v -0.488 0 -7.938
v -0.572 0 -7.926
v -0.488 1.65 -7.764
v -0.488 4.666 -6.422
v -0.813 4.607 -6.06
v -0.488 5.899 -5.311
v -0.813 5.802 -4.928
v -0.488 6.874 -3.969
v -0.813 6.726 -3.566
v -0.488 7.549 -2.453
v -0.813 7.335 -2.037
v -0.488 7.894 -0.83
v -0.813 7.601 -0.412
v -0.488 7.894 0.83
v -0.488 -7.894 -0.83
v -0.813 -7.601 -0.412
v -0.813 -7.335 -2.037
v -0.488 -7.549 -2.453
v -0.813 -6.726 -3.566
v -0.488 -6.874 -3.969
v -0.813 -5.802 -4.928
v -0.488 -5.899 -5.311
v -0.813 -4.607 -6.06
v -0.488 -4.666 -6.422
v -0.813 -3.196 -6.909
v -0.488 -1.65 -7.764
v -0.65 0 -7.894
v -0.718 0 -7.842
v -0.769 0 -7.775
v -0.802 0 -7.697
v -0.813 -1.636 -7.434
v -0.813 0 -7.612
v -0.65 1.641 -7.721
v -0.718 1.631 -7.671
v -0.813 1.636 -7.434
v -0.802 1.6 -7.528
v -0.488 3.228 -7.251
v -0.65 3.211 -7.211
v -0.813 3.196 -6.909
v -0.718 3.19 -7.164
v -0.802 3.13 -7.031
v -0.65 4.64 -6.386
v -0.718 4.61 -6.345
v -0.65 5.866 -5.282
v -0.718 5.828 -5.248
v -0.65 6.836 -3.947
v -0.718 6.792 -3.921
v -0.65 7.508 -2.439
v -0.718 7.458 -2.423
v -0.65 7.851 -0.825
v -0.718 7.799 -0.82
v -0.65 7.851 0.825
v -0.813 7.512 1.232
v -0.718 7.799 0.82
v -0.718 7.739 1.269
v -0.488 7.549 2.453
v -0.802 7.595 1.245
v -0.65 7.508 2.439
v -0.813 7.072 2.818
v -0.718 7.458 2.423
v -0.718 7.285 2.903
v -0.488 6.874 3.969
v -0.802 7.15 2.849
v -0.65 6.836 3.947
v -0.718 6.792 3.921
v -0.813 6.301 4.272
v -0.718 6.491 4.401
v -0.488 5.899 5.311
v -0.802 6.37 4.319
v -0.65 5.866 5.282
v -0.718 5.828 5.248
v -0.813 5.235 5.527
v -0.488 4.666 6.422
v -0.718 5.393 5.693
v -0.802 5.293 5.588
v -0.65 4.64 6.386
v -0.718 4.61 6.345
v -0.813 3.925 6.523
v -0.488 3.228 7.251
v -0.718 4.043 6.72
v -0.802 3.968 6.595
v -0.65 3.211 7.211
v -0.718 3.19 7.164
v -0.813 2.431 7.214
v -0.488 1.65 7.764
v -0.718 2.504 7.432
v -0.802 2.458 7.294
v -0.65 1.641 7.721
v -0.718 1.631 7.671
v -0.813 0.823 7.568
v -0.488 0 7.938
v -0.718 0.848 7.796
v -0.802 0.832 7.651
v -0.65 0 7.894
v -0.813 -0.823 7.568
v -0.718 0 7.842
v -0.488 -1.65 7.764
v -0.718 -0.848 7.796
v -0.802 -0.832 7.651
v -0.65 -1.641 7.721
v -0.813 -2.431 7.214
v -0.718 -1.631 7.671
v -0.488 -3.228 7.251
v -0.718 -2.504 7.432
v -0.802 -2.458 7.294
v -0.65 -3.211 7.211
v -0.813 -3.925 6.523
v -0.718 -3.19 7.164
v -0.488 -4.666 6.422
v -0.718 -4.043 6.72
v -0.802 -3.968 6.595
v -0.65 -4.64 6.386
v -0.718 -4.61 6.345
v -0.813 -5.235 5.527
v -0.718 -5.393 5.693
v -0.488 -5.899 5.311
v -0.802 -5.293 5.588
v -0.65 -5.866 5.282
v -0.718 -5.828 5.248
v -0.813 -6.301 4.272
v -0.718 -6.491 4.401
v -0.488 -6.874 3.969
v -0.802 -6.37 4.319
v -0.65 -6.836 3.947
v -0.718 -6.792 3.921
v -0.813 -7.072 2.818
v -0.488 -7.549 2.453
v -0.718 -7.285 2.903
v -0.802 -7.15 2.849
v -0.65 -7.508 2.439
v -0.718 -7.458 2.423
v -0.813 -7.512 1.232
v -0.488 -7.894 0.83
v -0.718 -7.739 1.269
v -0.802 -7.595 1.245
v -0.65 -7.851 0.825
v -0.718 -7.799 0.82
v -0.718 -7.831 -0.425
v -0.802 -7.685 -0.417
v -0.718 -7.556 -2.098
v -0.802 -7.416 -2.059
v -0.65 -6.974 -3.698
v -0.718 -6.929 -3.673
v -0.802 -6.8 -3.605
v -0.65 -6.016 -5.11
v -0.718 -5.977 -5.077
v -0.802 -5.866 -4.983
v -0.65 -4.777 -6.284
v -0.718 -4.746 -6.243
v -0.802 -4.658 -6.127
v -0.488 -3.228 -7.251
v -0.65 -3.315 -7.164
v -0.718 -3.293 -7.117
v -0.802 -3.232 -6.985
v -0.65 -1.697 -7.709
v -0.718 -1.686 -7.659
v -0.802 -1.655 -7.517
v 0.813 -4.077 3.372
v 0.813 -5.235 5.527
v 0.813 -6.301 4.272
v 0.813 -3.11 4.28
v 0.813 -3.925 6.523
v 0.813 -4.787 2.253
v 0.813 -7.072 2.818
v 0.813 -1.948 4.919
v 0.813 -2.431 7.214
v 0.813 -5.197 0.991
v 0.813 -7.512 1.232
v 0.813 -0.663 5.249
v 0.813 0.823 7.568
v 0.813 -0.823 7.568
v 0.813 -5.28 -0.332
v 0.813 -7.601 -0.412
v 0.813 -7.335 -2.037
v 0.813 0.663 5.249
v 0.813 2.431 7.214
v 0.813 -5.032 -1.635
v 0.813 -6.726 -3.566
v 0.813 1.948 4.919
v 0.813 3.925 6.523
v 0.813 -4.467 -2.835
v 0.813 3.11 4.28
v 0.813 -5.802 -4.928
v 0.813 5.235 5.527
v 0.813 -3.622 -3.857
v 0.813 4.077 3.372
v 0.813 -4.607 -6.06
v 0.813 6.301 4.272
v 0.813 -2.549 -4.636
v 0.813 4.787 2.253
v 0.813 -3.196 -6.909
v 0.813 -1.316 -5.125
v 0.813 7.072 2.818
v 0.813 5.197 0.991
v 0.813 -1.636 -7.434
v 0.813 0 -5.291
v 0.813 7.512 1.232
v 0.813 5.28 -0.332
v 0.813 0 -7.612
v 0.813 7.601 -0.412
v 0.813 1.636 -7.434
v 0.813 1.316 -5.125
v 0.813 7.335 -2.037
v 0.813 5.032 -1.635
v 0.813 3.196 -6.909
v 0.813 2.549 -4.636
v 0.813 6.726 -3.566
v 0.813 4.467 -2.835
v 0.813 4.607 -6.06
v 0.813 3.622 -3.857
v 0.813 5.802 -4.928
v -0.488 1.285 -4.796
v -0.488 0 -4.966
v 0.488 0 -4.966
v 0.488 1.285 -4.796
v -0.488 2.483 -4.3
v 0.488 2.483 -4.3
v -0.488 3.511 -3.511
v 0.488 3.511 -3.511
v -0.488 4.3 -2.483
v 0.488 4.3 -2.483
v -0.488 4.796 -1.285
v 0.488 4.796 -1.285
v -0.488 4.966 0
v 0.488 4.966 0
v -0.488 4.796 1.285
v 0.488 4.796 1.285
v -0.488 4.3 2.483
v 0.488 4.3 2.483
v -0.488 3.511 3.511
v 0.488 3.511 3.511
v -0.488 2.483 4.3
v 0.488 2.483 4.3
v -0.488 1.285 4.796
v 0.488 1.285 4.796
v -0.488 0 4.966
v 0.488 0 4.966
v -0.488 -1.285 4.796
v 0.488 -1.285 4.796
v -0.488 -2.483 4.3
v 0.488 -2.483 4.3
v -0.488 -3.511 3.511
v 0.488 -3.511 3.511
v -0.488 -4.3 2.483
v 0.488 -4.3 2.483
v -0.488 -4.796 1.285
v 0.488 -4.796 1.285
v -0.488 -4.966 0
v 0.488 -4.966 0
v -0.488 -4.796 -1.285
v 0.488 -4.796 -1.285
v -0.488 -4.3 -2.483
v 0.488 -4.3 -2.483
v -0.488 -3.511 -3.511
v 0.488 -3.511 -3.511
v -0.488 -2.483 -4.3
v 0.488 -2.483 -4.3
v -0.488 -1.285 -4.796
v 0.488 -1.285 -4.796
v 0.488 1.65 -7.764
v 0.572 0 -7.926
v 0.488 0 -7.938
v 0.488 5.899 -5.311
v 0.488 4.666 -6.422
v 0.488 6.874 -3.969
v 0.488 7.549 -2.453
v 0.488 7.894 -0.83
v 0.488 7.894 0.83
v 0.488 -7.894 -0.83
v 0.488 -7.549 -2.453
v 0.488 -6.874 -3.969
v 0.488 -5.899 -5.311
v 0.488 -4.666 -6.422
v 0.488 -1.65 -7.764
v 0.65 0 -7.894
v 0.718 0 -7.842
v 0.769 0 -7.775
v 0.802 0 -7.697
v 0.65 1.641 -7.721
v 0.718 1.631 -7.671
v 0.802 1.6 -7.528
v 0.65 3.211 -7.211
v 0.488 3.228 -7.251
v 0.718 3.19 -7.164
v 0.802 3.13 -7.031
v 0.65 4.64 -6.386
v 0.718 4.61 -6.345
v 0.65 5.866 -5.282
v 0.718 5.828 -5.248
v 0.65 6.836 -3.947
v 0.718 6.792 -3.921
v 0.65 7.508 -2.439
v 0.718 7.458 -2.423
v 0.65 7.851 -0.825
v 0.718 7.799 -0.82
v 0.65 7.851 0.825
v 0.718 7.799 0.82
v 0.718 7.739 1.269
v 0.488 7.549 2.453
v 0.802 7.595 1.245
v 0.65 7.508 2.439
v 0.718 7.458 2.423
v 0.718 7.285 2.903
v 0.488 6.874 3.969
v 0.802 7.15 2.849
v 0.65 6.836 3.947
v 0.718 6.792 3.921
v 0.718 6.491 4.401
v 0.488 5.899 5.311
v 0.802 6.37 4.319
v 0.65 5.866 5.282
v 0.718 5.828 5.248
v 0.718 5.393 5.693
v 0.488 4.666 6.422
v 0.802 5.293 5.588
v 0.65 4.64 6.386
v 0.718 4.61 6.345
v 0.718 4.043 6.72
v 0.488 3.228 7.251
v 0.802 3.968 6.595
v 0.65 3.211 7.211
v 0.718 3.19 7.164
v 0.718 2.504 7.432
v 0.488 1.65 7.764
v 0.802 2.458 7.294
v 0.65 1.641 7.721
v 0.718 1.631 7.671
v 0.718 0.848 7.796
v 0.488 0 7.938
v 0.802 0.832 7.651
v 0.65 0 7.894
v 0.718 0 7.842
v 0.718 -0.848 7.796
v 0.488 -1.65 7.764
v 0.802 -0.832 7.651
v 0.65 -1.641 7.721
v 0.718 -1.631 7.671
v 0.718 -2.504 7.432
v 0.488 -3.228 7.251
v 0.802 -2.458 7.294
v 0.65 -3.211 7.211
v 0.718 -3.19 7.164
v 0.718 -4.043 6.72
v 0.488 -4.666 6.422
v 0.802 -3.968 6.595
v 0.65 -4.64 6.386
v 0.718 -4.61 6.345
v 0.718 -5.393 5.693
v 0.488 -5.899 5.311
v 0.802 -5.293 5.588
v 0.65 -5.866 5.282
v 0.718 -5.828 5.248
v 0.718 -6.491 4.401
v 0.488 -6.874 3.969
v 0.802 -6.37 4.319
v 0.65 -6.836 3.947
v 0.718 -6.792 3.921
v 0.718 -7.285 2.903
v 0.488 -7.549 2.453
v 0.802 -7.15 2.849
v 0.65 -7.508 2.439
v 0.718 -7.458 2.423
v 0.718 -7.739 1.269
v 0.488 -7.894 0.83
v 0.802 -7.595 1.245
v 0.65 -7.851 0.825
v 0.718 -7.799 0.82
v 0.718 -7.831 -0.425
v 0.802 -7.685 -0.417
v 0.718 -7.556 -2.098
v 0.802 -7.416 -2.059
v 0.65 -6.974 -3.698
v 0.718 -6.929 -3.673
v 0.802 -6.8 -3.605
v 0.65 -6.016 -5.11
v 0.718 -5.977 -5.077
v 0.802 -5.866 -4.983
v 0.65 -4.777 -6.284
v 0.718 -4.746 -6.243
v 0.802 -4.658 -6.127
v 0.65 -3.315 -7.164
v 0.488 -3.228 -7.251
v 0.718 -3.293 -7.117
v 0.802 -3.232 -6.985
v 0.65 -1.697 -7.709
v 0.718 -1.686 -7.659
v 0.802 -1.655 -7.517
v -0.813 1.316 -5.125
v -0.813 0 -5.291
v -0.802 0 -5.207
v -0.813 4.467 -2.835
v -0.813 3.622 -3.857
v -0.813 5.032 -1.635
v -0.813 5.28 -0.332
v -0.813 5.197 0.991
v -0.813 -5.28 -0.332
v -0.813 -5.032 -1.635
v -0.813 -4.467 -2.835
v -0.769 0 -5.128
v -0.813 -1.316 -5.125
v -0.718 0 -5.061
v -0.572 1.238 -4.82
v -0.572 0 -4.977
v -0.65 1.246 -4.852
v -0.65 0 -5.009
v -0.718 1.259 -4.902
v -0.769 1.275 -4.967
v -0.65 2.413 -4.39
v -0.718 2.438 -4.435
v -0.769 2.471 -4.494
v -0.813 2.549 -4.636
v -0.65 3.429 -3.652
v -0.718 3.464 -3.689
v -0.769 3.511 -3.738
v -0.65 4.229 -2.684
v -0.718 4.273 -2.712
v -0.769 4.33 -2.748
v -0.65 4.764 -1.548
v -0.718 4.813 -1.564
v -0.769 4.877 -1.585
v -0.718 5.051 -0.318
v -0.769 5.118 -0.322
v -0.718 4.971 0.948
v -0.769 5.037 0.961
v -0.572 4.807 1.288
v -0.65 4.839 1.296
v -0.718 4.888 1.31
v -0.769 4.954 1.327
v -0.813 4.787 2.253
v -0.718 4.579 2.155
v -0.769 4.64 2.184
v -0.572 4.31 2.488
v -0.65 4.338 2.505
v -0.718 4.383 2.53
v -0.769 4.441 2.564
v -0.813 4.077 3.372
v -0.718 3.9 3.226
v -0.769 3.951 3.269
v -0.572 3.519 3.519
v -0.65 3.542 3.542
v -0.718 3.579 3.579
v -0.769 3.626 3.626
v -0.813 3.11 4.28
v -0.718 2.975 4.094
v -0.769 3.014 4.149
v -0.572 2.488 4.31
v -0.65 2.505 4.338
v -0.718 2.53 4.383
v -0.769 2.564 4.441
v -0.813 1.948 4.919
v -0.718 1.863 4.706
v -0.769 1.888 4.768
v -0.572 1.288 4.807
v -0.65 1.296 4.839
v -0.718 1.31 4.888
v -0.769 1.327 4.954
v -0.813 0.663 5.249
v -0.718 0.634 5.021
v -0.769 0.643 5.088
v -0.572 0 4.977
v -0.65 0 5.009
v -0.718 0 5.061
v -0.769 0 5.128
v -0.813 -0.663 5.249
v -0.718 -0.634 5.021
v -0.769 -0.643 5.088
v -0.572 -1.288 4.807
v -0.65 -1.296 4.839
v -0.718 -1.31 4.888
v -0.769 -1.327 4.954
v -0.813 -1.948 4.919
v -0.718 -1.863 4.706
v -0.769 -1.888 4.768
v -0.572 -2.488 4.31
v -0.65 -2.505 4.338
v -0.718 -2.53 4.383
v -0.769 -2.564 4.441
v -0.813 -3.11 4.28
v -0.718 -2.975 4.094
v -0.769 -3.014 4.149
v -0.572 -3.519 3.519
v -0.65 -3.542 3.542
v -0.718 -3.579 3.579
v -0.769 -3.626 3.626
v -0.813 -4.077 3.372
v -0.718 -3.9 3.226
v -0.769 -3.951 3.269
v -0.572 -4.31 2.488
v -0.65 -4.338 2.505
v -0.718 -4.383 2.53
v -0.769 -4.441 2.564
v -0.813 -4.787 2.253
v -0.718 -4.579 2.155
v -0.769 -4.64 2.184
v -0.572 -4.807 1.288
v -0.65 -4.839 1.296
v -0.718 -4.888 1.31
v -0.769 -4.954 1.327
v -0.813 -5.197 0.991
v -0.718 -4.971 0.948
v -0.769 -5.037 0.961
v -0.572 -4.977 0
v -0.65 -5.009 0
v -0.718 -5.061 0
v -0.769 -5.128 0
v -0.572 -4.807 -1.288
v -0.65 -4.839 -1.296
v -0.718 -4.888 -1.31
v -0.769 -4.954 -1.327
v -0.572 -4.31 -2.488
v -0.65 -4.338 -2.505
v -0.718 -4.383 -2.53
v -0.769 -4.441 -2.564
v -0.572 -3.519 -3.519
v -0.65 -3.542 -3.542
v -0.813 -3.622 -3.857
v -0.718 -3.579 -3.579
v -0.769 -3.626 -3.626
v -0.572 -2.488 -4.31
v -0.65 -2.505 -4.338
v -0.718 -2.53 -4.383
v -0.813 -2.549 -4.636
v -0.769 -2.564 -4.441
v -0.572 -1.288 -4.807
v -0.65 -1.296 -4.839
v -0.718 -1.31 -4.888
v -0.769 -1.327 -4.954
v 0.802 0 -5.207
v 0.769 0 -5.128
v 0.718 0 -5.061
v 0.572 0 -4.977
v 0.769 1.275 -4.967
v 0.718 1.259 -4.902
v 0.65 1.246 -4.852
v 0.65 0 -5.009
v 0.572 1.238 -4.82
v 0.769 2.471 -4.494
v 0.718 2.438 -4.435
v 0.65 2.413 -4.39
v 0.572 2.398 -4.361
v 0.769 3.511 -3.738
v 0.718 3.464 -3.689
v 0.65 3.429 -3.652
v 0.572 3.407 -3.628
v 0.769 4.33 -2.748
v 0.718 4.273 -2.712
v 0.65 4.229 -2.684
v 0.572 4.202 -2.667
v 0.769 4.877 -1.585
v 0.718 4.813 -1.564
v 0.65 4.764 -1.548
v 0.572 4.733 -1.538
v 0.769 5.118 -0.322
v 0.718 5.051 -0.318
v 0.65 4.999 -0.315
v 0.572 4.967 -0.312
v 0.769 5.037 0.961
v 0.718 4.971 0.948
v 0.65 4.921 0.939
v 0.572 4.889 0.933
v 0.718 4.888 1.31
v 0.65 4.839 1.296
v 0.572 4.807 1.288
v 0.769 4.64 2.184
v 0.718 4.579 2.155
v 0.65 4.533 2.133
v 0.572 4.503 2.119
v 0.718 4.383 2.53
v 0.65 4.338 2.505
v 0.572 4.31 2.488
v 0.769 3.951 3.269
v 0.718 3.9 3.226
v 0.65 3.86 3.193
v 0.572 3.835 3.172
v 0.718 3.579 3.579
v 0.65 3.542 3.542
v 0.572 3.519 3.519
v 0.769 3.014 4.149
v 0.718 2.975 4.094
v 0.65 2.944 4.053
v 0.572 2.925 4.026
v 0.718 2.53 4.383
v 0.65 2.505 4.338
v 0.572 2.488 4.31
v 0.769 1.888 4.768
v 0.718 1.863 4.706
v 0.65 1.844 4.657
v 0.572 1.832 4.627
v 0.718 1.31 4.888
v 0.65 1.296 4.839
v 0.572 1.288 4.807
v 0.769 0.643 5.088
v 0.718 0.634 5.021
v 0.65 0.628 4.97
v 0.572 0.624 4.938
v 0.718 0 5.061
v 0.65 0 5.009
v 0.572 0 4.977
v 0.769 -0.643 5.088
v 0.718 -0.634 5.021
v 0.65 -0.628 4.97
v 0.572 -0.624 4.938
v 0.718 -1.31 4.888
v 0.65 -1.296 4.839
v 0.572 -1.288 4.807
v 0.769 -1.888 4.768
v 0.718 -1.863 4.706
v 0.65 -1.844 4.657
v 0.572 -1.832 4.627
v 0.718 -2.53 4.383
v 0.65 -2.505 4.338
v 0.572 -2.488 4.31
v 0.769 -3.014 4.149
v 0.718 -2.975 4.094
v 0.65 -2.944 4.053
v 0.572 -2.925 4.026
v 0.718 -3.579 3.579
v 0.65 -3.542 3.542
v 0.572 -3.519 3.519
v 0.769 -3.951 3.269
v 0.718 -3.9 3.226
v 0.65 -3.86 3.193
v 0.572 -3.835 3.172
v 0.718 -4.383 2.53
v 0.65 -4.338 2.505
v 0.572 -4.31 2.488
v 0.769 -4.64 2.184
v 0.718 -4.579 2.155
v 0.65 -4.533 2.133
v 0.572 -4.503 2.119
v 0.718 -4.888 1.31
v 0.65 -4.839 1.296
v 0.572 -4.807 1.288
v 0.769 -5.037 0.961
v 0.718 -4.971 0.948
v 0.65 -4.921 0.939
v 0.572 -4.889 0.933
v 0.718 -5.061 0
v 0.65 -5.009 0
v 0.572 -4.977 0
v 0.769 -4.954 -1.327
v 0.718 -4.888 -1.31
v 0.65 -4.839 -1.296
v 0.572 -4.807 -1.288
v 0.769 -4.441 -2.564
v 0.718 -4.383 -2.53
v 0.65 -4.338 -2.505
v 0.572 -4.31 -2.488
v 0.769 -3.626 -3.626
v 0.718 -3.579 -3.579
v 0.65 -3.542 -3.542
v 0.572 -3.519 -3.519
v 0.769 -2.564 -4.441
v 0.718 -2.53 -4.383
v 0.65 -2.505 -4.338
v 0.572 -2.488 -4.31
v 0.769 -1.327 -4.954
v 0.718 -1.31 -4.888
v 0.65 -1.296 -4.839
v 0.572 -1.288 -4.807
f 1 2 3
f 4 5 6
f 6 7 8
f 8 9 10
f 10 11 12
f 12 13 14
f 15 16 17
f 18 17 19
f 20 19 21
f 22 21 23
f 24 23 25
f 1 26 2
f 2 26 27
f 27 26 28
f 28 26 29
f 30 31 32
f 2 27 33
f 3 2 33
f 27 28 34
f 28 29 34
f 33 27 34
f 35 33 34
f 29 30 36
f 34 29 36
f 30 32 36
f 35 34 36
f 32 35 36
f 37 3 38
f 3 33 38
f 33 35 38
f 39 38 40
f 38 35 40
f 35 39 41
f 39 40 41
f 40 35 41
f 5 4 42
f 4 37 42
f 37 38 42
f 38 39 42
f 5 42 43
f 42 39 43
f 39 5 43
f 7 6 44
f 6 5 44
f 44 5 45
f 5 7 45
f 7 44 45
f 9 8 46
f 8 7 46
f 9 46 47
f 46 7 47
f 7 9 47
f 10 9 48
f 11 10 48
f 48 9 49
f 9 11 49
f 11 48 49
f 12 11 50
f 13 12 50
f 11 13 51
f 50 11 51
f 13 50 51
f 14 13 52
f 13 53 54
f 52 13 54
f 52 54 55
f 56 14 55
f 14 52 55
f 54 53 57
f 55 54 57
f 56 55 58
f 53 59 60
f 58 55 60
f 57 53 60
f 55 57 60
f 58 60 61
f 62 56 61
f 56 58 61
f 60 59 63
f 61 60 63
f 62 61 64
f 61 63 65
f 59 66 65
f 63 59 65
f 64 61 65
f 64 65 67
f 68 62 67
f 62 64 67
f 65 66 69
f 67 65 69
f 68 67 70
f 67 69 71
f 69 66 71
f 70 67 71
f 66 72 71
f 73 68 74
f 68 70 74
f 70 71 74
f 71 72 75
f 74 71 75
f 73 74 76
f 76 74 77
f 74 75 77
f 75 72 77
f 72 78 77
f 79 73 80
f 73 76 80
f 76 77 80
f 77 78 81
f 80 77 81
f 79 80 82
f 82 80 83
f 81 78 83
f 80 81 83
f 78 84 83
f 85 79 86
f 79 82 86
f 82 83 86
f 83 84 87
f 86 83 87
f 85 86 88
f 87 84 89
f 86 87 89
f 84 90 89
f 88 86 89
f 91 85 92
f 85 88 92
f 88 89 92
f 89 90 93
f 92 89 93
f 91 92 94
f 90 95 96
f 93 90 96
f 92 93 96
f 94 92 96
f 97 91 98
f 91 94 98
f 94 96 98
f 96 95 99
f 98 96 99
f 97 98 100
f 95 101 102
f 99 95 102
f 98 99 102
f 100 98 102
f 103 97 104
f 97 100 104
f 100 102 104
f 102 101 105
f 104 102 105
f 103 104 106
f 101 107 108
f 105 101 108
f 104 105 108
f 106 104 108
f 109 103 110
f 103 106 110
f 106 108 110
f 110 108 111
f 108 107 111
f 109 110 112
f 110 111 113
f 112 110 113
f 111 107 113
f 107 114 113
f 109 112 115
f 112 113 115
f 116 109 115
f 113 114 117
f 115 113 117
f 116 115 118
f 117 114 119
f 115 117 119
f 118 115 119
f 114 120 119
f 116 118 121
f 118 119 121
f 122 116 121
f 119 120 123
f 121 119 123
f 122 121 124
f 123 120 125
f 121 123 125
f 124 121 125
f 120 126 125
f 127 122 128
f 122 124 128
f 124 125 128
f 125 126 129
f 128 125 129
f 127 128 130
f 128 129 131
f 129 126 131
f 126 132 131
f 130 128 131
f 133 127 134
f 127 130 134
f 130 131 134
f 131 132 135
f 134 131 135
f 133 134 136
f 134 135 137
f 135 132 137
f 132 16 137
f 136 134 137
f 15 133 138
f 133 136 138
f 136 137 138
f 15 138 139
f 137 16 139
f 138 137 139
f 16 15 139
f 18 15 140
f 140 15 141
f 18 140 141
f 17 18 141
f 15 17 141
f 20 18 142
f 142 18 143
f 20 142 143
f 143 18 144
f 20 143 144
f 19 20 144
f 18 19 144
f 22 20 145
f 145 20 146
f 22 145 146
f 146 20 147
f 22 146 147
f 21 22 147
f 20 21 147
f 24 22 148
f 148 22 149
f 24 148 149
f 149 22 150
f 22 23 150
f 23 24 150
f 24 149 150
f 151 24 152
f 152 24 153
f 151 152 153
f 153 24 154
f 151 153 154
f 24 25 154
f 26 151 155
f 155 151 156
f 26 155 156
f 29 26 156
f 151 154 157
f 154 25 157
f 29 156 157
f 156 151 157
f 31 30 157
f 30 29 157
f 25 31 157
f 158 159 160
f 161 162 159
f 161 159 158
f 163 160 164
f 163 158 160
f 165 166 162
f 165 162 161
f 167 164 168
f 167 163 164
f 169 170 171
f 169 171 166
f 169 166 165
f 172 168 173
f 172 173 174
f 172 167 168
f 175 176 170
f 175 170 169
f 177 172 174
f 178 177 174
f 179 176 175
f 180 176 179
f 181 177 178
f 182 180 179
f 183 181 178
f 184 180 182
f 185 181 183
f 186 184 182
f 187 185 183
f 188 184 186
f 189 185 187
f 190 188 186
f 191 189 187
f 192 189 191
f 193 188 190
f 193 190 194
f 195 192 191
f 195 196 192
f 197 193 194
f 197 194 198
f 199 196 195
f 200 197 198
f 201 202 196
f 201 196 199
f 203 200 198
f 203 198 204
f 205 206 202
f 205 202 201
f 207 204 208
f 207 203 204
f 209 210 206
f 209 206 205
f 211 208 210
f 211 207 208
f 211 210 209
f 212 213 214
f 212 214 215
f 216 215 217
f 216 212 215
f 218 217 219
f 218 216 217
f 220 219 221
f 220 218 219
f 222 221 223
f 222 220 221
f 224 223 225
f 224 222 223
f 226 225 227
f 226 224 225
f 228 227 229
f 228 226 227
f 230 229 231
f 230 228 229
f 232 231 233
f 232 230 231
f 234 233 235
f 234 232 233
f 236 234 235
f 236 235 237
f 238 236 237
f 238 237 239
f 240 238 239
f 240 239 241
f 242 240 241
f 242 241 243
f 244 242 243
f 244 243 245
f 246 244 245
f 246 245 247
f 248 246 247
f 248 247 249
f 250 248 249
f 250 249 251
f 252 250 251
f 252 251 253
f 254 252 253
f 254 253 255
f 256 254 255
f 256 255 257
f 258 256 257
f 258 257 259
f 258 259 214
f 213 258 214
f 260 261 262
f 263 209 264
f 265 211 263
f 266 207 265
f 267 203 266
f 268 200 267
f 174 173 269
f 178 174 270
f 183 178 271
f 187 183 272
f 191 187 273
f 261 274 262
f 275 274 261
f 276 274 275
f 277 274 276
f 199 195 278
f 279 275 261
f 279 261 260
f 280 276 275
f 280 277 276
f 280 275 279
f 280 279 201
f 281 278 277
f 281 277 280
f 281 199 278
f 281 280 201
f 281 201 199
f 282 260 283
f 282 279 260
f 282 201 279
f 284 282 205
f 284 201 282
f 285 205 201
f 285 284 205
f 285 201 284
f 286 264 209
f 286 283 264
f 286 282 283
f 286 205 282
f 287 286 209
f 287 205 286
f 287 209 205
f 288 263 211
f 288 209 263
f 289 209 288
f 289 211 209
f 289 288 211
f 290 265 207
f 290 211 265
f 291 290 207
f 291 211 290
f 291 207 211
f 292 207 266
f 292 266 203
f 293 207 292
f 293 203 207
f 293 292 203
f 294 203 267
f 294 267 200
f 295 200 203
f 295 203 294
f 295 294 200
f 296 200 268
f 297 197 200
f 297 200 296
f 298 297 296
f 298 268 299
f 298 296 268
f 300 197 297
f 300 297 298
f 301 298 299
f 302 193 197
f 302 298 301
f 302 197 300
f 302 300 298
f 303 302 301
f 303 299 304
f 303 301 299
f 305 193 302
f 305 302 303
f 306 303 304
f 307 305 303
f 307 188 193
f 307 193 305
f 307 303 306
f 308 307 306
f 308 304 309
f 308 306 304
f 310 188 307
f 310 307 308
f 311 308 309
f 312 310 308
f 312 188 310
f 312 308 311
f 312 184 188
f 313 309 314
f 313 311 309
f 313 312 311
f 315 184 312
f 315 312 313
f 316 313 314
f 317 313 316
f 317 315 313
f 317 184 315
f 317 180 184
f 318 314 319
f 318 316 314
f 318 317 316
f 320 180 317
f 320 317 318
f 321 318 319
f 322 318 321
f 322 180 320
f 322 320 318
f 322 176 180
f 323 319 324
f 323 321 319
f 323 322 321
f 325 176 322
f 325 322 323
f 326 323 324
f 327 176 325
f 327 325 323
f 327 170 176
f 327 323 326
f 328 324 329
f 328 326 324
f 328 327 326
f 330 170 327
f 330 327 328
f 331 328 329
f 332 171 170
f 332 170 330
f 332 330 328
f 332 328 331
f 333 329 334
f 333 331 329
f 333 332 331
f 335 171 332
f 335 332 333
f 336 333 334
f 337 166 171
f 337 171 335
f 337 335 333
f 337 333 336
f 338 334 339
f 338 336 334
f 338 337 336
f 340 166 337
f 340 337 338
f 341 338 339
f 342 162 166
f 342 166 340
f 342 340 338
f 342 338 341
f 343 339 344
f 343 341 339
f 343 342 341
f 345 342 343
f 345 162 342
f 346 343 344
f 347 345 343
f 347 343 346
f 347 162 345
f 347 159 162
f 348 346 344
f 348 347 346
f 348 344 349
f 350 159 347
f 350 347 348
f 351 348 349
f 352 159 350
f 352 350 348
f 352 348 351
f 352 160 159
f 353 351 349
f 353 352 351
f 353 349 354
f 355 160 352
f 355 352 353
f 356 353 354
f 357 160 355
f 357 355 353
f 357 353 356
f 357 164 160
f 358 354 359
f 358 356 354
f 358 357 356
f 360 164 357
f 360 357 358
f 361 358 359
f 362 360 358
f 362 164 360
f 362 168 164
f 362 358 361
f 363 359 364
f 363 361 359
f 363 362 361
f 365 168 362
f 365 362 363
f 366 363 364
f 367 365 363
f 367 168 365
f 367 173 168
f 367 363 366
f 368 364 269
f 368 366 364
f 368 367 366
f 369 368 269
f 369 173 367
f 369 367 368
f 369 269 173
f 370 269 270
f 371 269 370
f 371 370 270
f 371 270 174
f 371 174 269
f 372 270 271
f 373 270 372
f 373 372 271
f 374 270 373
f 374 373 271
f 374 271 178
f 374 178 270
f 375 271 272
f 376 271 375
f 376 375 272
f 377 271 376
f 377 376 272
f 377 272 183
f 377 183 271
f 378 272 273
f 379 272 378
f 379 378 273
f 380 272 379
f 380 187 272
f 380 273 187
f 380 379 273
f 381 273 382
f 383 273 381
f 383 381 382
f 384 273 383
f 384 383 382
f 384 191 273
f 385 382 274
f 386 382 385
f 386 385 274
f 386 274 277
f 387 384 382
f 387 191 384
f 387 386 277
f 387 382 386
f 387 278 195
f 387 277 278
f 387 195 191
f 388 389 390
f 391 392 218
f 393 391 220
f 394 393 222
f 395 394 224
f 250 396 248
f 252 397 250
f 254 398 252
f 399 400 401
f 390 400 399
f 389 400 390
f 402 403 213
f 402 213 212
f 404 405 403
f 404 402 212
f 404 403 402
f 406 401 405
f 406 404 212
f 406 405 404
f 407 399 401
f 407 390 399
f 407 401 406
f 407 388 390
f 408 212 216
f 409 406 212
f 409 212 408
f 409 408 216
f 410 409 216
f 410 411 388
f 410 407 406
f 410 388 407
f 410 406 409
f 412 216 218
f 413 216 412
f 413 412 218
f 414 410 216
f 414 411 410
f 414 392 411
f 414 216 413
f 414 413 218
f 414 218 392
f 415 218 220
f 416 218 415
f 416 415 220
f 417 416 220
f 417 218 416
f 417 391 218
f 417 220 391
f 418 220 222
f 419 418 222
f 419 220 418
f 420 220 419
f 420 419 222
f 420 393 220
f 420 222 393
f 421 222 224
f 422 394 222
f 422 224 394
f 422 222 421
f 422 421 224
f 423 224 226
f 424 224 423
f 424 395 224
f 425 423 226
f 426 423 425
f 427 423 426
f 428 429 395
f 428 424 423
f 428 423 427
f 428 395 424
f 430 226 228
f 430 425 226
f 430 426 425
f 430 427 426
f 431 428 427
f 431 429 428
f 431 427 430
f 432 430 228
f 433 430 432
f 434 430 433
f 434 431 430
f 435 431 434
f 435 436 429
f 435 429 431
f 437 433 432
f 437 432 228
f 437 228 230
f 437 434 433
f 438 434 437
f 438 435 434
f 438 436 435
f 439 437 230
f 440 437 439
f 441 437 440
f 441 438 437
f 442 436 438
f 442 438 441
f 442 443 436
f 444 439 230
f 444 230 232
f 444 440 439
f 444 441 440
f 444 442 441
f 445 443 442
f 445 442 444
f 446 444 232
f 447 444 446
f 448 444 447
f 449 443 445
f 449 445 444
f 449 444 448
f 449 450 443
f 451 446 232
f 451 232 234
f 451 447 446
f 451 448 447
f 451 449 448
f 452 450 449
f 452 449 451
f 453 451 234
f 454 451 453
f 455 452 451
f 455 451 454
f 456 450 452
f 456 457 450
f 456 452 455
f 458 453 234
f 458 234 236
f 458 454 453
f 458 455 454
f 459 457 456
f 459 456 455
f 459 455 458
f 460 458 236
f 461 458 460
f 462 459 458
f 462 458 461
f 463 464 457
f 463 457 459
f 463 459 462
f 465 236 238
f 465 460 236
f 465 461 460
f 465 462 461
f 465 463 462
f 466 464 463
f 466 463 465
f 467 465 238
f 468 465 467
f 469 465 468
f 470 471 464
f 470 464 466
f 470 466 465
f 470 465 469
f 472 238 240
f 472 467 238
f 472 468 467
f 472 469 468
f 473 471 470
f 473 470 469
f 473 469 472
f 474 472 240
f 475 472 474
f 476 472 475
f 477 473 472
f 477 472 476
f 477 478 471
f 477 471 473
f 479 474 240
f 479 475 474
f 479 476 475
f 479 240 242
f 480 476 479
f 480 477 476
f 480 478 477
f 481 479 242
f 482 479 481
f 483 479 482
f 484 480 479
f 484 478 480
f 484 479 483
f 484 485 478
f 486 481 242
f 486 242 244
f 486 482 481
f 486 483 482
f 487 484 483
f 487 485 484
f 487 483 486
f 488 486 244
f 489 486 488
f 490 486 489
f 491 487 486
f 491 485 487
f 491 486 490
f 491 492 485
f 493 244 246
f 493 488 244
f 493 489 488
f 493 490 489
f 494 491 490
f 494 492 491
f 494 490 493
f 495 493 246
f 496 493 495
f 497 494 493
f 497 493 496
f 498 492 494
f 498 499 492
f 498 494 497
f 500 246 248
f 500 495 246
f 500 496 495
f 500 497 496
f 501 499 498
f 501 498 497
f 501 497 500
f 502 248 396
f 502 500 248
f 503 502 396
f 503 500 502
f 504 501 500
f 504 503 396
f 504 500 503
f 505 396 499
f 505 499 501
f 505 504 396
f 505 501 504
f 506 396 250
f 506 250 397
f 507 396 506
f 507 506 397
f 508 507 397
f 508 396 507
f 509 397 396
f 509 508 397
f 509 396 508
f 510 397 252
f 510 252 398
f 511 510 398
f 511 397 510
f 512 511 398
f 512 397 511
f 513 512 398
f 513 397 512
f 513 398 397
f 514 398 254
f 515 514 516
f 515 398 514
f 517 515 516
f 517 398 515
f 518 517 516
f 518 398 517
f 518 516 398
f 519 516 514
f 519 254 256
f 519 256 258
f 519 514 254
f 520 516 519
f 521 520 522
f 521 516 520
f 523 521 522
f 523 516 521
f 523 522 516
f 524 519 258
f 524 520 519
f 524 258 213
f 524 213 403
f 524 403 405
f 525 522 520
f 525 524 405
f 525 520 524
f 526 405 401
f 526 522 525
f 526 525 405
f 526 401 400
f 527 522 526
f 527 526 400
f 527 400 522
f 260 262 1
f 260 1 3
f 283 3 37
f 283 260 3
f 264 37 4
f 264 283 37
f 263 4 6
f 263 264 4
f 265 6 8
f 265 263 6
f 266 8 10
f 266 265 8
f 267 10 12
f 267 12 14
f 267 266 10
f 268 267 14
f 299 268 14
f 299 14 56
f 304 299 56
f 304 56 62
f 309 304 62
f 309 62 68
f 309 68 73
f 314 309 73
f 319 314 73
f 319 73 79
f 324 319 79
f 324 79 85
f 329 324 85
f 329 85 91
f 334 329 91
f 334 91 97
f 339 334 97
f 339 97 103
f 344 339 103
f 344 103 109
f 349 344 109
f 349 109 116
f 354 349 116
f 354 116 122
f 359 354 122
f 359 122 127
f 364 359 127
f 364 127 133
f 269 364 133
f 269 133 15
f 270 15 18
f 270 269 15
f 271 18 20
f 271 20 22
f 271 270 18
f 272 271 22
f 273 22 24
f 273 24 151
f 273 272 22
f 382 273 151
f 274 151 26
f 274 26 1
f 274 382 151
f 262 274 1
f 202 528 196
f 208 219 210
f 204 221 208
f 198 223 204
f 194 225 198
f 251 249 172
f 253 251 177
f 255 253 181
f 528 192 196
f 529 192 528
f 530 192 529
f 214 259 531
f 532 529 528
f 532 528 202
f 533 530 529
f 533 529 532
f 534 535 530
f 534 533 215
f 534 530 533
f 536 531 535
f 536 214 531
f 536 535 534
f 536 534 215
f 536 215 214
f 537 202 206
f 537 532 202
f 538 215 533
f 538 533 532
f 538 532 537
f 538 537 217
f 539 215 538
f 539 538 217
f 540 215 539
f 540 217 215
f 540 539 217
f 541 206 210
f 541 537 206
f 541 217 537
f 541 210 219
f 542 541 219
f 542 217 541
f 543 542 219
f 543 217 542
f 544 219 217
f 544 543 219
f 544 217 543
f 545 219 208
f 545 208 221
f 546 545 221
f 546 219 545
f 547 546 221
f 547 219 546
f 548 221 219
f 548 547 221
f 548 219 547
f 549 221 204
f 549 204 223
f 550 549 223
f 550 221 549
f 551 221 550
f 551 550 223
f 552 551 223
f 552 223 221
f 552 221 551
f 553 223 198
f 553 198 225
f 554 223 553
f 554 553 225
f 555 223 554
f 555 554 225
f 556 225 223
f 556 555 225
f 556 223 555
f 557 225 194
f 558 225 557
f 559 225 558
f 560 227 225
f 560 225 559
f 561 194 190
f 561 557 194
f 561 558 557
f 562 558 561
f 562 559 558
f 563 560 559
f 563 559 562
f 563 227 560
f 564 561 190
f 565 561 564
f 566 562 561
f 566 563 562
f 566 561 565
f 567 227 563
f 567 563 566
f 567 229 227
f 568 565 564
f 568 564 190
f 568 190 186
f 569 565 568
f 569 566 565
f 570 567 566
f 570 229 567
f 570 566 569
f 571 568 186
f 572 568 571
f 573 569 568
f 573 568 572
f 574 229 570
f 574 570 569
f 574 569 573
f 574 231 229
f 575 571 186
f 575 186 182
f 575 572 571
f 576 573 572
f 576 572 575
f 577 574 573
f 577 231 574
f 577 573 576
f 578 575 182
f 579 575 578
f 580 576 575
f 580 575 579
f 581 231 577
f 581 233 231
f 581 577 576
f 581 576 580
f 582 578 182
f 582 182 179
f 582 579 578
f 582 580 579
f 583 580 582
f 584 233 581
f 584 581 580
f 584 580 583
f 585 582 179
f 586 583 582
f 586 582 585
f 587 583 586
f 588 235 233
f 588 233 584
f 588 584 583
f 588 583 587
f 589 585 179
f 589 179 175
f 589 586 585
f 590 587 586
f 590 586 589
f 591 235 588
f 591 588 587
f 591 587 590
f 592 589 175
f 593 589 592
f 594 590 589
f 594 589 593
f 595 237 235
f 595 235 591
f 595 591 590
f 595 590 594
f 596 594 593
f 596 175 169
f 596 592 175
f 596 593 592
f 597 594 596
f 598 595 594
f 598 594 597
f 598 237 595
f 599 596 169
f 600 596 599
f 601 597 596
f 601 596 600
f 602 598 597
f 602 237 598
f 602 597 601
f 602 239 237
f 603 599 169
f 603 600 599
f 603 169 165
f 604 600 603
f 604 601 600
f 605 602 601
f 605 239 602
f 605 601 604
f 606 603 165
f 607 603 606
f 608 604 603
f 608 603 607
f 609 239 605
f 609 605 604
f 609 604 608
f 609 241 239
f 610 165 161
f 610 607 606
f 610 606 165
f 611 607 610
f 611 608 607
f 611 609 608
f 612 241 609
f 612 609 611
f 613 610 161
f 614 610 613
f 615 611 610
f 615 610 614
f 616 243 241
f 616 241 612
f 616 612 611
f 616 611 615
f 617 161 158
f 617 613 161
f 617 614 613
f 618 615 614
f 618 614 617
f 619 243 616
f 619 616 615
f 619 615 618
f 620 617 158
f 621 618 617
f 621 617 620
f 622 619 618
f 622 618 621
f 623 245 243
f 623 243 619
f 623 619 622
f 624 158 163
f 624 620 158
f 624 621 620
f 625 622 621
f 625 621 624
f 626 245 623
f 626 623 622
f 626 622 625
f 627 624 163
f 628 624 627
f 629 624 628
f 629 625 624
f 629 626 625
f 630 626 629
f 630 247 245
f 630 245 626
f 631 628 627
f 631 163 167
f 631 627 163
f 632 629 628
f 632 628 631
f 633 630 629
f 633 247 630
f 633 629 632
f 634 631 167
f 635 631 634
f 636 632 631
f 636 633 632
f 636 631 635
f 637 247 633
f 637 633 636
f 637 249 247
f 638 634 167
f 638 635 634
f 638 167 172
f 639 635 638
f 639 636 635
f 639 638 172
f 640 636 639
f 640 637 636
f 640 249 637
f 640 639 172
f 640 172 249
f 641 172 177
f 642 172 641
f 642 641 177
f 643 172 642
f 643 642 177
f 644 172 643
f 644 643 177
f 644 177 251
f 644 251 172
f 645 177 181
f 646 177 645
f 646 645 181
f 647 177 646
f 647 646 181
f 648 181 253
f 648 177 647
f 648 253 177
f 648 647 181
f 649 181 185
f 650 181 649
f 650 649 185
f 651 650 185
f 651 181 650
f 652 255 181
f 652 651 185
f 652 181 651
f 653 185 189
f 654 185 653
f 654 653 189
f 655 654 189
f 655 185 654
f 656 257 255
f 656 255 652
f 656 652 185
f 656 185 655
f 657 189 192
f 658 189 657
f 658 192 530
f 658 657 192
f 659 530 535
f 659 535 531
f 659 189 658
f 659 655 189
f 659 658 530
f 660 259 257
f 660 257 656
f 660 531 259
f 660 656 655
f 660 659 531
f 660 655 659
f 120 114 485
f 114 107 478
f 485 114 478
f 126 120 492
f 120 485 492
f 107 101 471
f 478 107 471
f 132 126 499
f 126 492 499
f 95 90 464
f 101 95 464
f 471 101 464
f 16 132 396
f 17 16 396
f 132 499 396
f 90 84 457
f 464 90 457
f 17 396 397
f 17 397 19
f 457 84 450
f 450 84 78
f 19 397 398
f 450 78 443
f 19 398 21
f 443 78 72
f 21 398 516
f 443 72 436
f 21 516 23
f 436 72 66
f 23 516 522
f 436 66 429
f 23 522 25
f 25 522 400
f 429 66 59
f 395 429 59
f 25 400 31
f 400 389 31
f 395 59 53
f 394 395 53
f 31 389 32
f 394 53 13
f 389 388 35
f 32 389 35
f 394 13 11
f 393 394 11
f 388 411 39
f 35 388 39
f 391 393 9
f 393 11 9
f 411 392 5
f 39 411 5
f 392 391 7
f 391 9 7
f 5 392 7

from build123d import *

# Parameters (mm, degrees)
SKETCH1_R           = 7.9375
SKETCH1_R_2         = 4.9657
BOSS_EXTRUDE1_DEPTH = 0.8128
FILLET1_R           = 0.32512


with BuildPart() as part:
    # Sketch1 → Boss-Extrude1 (new, symmetric)
    with BuildSketch(Plane(origin=(0, 0, 0), x_dir=(0, 0, -1), z_dir=(1, 0, 0))):
        Circle(SKETCH1_R)
        Circle(SKETCH1_R_2, mode=Mode.SUBTRACT)
    extrude(amount=BOSS_EXTRUDE1_DEPTH, both=True)

    # Fillet1
    fillet1_edges = [part.edges().sort_by_distance(p)[0] for p in [
        (-0.8128, 0, 7.9375),
        (0.8128, 0, 7.9375),
        (-0.8128, 0, 4.9657),
        (0.8128, 0, 4.9657),
    ]]
    fillet(fillet1_edges, radius=FILLET1_R)


solid = part.part
